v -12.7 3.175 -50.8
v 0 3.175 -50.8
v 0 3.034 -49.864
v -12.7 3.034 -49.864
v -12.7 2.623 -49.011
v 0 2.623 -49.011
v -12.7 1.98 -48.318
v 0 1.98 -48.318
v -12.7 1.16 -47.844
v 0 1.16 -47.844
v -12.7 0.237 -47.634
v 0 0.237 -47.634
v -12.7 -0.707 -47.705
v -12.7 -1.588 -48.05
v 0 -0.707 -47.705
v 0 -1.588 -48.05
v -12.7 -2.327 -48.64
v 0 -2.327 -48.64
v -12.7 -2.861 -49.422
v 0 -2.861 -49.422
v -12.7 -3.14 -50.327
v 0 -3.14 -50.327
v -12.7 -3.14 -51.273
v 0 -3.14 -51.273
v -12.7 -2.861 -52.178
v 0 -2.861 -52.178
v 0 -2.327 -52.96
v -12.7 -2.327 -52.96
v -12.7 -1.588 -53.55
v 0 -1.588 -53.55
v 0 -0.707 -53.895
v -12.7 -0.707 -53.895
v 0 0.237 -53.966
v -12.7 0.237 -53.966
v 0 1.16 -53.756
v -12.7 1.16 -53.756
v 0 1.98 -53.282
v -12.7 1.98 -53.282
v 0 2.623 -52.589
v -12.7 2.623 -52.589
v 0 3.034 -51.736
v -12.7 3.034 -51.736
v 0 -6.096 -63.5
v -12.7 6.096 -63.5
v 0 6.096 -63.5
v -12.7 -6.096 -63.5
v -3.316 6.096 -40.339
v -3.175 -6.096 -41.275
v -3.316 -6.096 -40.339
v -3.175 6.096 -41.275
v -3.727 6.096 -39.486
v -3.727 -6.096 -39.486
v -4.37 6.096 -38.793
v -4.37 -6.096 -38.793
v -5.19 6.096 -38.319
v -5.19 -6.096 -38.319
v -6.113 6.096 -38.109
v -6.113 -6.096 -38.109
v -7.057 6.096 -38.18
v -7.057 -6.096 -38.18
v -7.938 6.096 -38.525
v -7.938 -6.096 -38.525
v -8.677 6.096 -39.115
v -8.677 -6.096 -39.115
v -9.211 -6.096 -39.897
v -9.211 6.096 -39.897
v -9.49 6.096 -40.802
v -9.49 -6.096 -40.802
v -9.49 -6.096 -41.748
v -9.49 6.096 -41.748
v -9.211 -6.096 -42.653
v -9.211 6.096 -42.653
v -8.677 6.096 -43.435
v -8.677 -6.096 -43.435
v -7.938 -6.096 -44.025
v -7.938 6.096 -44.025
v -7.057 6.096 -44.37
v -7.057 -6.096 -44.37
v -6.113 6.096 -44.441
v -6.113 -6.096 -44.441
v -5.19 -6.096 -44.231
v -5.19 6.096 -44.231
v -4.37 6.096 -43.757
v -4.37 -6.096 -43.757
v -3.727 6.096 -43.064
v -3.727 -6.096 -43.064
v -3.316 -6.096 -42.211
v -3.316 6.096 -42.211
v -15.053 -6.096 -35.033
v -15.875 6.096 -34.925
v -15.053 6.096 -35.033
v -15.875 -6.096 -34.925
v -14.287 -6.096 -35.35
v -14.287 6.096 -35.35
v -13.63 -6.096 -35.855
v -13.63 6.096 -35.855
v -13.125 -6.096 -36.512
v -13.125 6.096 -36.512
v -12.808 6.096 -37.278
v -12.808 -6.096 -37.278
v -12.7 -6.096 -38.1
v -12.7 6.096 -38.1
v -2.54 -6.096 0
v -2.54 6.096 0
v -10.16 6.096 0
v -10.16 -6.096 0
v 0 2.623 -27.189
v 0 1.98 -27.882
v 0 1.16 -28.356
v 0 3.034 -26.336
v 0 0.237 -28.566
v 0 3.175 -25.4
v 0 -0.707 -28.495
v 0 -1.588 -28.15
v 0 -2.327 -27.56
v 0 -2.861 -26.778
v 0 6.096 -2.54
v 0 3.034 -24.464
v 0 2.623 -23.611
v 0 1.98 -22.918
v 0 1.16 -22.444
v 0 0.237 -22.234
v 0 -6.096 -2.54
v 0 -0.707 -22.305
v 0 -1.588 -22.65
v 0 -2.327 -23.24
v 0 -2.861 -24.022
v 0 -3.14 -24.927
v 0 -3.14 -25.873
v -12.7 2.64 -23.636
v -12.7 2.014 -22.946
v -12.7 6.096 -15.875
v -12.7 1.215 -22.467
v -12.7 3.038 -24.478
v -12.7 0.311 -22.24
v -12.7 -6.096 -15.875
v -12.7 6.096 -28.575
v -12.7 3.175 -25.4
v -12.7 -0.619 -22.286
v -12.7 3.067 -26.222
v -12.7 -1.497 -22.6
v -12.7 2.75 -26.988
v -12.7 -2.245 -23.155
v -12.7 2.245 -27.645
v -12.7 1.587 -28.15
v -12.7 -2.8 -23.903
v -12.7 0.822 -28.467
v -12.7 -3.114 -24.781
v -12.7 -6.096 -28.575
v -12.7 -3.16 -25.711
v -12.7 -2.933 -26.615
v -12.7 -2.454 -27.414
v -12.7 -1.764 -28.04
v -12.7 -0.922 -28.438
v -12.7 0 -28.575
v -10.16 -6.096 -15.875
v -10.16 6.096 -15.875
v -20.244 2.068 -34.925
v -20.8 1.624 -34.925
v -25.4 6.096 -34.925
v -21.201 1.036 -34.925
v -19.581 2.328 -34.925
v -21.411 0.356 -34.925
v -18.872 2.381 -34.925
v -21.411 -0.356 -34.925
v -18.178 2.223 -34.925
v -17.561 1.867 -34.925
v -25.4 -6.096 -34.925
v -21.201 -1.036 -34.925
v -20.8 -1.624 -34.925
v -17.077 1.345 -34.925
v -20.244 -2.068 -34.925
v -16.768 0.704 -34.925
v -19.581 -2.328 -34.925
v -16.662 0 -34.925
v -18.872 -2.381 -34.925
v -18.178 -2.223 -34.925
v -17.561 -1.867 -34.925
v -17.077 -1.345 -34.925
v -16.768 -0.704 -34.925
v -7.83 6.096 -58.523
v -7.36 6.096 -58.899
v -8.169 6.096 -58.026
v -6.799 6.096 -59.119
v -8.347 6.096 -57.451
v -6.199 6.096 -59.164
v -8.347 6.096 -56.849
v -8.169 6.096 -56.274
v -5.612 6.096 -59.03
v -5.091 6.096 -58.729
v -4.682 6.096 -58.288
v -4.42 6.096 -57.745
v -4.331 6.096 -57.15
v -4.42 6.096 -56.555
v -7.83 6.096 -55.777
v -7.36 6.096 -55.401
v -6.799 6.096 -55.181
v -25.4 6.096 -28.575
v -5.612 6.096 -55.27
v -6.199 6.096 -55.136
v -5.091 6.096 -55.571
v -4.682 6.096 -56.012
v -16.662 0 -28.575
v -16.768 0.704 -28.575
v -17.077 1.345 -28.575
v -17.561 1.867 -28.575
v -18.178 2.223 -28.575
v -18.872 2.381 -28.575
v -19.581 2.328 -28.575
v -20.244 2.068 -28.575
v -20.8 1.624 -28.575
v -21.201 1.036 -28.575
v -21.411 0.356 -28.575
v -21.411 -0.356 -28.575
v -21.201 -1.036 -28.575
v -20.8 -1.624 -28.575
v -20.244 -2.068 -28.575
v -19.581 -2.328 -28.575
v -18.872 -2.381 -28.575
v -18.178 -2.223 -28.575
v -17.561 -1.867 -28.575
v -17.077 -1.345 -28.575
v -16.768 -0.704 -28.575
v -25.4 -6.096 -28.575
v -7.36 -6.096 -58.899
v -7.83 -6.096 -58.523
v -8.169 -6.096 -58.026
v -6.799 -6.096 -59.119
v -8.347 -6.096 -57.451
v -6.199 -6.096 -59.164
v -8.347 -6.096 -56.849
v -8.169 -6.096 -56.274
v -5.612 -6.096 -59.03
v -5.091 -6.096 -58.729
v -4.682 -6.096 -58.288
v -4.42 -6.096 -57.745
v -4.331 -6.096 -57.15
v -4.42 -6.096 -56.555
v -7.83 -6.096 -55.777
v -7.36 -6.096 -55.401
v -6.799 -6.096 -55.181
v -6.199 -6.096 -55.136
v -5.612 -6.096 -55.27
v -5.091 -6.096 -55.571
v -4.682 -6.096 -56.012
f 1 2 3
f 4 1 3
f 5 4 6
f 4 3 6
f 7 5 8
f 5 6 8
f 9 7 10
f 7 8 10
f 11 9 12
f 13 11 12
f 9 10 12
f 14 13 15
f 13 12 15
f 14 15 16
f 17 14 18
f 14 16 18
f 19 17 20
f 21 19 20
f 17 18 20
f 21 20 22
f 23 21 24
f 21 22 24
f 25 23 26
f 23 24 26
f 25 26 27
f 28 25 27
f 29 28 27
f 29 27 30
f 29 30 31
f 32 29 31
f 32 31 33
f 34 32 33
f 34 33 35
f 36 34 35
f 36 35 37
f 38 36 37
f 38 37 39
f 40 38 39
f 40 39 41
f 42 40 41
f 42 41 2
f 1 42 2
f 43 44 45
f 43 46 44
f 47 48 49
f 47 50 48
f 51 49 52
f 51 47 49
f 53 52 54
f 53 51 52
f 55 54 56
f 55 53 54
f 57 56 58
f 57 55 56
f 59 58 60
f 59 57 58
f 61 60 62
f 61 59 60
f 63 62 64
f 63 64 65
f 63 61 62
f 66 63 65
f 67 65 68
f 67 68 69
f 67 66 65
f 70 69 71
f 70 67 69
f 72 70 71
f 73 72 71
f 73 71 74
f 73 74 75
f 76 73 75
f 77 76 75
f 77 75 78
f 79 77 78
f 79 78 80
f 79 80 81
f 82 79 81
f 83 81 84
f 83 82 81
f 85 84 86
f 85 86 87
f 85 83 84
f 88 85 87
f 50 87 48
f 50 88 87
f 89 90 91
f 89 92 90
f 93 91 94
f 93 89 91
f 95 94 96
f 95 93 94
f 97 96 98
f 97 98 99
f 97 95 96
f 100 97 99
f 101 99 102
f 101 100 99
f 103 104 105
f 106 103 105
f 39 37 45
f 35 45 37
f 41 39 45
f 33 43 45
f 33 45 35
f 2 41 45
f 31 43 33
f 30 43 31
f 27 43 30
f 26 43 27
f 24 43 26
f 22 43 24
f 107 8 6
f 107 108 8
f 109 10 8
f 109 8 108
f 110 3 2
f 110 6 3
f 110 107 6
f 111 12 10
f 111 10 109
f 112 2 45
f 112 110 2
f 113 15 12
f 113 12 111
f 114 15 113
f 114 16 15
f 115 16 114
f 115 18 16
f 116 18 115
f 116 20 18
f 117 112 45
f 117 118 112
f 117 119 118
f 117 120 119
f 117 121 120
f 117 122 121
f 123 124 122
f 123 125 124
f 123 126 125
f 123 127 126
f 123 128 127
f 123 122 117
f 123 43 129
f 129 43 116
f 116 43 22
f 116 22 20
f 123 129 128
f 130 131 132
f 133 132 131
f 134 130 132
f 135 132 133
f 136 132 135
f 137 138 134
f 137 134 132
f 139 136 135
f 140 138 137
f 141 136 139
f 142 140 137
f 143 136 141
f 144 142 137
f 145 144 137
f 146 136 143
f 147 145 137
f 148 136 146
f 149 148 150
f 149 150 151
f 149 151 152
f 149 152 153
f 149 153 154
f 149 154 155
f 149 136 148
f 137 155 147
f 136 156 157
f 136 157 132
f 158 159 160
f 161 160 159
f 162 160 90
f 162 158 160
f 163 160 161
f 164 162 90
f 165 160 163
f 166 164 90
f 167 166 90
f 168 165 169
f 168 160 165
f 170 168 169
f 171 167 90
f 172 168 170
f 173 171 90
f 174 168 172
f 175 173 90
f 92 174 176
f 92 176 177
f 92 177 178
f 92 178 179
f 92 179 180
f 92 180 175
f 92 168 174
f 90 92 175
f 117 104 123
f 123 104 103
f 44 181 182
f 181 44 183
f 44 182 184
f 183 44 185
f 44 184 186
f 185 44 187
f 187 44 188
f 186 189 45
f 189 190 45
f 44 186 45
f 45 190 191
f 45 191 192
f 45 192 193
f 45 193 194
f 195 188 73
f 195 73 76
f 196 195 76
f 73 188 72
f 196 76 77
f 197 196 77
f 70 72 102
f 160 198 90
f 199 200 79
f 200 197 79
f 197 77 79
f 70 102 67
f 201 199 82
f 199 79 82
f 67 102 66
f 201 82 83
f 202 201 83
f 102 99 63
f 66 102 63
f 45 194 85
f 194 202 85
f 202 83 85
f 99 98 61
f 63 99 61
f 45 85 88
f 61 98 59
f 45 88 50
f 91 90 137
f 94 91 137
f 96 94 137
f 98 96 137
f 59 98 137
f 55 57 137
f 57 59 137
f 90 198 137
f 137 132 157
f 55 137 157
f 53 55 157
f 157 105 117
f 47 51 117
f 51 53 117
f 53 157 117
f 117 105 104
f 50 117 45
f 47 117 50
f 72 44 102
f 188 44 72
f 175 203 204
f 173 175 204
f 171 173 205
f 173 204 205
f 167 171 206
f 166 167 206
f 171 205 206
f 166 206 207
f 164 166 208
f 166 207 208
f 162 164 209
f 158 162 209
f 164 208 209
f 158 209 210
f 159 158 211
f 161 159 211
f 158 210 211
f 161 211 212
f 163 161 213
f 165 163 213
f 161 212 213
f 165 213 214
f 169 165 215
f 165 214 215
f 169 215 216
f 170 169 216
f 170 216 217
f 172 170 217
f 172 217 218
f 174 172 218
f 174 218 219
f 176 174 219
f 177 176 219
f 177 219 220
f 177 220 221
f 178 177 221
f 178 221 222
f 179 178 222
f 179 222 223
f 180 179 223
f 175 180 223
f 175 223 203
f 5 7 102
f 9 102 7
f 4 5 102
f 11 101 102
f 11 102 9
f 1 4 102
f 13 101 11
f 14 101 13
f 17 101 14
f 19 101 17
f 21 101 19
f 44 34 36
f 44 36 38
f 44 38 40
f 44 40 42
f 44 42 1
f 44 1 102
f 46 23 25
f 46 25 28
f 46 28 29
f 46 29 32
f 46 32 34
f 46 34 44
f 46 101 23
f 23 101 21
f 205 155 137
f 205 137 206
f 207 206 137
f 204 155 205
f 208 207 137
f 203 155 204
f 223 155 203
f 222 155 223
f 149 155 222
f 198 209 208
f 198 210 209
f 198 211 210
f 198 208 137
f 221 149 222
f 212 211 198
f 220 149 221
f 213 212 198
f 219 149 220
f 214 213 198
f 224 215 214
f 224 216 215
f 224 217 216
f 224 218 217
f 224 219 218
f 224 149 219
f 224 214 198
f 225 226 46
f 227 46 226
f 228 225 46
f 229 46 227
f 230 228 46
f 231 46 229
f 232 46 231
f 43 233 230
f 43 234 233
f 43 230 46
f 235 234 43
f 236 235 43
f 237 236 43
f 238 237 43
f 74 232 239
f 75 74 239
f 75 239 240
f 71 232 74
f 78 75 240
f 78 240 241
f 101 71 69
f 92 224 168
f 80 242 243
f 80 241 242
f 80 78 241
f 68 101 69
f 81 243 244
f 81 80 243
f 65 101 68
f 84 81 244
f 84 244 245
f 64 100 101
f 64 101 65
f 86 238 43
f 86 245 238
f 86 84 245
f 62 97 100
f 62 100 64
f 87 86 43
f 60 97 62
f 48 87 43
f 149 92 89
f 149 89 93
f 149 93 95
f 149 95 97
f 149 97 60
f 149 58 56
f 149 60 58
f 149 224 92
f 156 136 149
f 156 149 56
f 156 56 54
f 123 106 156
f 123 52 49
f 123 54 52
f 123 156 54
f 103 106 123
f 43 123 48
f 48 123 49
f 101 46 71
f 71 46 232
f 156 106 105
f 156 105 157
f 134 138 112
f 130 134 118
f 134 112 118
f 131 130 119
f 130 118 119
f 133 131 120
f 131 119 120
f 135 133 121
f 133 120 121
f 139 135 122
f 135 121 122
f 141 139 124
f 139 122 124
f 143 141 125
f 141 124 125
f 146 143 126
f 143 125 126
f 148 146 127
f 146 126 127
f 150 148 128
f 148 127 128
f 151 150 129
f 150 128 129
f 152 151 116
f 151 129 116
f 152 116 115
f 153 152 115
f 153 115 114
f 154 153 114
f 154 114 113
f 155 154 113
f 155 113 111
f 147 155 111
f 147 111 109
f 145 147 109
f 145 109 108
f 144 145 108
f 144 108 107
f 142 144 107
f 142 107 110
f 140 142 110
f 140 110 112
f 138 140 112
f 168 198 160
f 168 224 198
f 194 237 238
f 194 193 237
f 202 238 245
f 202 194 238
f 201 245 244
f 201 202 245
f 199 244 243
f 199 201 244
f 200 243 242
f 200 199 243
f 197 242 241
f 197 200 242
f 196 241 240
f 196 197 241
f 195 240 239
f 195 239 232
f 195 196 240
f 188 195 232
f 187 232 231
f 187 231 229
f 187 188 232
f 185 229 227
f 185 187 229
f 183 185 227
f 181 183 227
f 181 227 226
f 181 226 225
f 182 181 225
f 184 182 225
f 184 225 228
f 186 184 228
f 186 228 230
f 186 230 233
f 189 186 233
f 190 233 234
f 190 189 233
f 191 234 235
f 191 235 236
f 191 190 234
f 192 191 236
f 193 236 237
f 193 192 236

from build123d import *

# Parameters (mm, degrees)
F0_R     = 2.0193
F0_R_2   = 3.175
F1_DEPTH = 6.096
F2_R     = 3.175
F3_DEPTH = 25.401
F4_R     = 2.3876
F5_DEPTH = 34.926
F6_SIZE  = 2.54


with BuildPart() as f1:
    # F0 (on Front) → F1 (new body, symmetric)
    with BuildSketch(Plane.XZ):
        with BuildLine():
            Line((0, -63.5), (0, 0))
            Line((0, 0), (-10.16, 0))
            Line((-10.16, 0), (-10.16, -15.875))
            Line((-10.16, -15.875), (-12.7, -15.875))
            Line((-12.7, -15.875), (-12.7, -28.575))
            Line((-12.7, -28.575), (-25.4, -28.575))
            Line((-25.4, -28.575), (-25.4, -34.925))
            Line((-25.4, -34.925), (-15.875, -34.925))
            ThreePointArc((-15.875, -34.925), (-13.6299359697, -35.8549359697), (-12.7, -38.1))
            Line((-12.7, -38.1), (-12.7, -63.5))
            Line((-12.7, -63.5), (0, -63.5))
        make_face()
        with Locations((-6.35, -57.15)):
            Circle(F0_R, mode=Mode.SUBTRACT)
        with Locations((-6.35, -41.275)):
            Circle(F0_R_2, mode=Mode.SUBTRACT)
    extrude(amount=F1_DEPTH, both=True)

    # F2 (on face) → F3 (cut, through all)
    with BuildSketch(Plane.YZ):
        with Locations((0, -25.4)):
            Circle(F2_R)
        with Locations((0, -50.8)):
            Circle(F2_R)
    extrude(amount=-F3_DEPTH, mode=Mode.SUBTRACT)

    # F4 (on face) → F5 (cut, through all)
    with BuildSketch(Plane.XY.offset(-28.575)):
        with Locations((-19.05, 0)):
            Circle(F4_R)
    extrude(amount=-F5_DEPTH, mode=Mode.SUBTRACT)

    # F6
    f6_edges = [f1.edges().sort_by_distance(p)[0] for p in [
        (0, 0, 0),
    ]]
    chamfer(f6_edges, length=F6_SIZE)


solid = f1.part
